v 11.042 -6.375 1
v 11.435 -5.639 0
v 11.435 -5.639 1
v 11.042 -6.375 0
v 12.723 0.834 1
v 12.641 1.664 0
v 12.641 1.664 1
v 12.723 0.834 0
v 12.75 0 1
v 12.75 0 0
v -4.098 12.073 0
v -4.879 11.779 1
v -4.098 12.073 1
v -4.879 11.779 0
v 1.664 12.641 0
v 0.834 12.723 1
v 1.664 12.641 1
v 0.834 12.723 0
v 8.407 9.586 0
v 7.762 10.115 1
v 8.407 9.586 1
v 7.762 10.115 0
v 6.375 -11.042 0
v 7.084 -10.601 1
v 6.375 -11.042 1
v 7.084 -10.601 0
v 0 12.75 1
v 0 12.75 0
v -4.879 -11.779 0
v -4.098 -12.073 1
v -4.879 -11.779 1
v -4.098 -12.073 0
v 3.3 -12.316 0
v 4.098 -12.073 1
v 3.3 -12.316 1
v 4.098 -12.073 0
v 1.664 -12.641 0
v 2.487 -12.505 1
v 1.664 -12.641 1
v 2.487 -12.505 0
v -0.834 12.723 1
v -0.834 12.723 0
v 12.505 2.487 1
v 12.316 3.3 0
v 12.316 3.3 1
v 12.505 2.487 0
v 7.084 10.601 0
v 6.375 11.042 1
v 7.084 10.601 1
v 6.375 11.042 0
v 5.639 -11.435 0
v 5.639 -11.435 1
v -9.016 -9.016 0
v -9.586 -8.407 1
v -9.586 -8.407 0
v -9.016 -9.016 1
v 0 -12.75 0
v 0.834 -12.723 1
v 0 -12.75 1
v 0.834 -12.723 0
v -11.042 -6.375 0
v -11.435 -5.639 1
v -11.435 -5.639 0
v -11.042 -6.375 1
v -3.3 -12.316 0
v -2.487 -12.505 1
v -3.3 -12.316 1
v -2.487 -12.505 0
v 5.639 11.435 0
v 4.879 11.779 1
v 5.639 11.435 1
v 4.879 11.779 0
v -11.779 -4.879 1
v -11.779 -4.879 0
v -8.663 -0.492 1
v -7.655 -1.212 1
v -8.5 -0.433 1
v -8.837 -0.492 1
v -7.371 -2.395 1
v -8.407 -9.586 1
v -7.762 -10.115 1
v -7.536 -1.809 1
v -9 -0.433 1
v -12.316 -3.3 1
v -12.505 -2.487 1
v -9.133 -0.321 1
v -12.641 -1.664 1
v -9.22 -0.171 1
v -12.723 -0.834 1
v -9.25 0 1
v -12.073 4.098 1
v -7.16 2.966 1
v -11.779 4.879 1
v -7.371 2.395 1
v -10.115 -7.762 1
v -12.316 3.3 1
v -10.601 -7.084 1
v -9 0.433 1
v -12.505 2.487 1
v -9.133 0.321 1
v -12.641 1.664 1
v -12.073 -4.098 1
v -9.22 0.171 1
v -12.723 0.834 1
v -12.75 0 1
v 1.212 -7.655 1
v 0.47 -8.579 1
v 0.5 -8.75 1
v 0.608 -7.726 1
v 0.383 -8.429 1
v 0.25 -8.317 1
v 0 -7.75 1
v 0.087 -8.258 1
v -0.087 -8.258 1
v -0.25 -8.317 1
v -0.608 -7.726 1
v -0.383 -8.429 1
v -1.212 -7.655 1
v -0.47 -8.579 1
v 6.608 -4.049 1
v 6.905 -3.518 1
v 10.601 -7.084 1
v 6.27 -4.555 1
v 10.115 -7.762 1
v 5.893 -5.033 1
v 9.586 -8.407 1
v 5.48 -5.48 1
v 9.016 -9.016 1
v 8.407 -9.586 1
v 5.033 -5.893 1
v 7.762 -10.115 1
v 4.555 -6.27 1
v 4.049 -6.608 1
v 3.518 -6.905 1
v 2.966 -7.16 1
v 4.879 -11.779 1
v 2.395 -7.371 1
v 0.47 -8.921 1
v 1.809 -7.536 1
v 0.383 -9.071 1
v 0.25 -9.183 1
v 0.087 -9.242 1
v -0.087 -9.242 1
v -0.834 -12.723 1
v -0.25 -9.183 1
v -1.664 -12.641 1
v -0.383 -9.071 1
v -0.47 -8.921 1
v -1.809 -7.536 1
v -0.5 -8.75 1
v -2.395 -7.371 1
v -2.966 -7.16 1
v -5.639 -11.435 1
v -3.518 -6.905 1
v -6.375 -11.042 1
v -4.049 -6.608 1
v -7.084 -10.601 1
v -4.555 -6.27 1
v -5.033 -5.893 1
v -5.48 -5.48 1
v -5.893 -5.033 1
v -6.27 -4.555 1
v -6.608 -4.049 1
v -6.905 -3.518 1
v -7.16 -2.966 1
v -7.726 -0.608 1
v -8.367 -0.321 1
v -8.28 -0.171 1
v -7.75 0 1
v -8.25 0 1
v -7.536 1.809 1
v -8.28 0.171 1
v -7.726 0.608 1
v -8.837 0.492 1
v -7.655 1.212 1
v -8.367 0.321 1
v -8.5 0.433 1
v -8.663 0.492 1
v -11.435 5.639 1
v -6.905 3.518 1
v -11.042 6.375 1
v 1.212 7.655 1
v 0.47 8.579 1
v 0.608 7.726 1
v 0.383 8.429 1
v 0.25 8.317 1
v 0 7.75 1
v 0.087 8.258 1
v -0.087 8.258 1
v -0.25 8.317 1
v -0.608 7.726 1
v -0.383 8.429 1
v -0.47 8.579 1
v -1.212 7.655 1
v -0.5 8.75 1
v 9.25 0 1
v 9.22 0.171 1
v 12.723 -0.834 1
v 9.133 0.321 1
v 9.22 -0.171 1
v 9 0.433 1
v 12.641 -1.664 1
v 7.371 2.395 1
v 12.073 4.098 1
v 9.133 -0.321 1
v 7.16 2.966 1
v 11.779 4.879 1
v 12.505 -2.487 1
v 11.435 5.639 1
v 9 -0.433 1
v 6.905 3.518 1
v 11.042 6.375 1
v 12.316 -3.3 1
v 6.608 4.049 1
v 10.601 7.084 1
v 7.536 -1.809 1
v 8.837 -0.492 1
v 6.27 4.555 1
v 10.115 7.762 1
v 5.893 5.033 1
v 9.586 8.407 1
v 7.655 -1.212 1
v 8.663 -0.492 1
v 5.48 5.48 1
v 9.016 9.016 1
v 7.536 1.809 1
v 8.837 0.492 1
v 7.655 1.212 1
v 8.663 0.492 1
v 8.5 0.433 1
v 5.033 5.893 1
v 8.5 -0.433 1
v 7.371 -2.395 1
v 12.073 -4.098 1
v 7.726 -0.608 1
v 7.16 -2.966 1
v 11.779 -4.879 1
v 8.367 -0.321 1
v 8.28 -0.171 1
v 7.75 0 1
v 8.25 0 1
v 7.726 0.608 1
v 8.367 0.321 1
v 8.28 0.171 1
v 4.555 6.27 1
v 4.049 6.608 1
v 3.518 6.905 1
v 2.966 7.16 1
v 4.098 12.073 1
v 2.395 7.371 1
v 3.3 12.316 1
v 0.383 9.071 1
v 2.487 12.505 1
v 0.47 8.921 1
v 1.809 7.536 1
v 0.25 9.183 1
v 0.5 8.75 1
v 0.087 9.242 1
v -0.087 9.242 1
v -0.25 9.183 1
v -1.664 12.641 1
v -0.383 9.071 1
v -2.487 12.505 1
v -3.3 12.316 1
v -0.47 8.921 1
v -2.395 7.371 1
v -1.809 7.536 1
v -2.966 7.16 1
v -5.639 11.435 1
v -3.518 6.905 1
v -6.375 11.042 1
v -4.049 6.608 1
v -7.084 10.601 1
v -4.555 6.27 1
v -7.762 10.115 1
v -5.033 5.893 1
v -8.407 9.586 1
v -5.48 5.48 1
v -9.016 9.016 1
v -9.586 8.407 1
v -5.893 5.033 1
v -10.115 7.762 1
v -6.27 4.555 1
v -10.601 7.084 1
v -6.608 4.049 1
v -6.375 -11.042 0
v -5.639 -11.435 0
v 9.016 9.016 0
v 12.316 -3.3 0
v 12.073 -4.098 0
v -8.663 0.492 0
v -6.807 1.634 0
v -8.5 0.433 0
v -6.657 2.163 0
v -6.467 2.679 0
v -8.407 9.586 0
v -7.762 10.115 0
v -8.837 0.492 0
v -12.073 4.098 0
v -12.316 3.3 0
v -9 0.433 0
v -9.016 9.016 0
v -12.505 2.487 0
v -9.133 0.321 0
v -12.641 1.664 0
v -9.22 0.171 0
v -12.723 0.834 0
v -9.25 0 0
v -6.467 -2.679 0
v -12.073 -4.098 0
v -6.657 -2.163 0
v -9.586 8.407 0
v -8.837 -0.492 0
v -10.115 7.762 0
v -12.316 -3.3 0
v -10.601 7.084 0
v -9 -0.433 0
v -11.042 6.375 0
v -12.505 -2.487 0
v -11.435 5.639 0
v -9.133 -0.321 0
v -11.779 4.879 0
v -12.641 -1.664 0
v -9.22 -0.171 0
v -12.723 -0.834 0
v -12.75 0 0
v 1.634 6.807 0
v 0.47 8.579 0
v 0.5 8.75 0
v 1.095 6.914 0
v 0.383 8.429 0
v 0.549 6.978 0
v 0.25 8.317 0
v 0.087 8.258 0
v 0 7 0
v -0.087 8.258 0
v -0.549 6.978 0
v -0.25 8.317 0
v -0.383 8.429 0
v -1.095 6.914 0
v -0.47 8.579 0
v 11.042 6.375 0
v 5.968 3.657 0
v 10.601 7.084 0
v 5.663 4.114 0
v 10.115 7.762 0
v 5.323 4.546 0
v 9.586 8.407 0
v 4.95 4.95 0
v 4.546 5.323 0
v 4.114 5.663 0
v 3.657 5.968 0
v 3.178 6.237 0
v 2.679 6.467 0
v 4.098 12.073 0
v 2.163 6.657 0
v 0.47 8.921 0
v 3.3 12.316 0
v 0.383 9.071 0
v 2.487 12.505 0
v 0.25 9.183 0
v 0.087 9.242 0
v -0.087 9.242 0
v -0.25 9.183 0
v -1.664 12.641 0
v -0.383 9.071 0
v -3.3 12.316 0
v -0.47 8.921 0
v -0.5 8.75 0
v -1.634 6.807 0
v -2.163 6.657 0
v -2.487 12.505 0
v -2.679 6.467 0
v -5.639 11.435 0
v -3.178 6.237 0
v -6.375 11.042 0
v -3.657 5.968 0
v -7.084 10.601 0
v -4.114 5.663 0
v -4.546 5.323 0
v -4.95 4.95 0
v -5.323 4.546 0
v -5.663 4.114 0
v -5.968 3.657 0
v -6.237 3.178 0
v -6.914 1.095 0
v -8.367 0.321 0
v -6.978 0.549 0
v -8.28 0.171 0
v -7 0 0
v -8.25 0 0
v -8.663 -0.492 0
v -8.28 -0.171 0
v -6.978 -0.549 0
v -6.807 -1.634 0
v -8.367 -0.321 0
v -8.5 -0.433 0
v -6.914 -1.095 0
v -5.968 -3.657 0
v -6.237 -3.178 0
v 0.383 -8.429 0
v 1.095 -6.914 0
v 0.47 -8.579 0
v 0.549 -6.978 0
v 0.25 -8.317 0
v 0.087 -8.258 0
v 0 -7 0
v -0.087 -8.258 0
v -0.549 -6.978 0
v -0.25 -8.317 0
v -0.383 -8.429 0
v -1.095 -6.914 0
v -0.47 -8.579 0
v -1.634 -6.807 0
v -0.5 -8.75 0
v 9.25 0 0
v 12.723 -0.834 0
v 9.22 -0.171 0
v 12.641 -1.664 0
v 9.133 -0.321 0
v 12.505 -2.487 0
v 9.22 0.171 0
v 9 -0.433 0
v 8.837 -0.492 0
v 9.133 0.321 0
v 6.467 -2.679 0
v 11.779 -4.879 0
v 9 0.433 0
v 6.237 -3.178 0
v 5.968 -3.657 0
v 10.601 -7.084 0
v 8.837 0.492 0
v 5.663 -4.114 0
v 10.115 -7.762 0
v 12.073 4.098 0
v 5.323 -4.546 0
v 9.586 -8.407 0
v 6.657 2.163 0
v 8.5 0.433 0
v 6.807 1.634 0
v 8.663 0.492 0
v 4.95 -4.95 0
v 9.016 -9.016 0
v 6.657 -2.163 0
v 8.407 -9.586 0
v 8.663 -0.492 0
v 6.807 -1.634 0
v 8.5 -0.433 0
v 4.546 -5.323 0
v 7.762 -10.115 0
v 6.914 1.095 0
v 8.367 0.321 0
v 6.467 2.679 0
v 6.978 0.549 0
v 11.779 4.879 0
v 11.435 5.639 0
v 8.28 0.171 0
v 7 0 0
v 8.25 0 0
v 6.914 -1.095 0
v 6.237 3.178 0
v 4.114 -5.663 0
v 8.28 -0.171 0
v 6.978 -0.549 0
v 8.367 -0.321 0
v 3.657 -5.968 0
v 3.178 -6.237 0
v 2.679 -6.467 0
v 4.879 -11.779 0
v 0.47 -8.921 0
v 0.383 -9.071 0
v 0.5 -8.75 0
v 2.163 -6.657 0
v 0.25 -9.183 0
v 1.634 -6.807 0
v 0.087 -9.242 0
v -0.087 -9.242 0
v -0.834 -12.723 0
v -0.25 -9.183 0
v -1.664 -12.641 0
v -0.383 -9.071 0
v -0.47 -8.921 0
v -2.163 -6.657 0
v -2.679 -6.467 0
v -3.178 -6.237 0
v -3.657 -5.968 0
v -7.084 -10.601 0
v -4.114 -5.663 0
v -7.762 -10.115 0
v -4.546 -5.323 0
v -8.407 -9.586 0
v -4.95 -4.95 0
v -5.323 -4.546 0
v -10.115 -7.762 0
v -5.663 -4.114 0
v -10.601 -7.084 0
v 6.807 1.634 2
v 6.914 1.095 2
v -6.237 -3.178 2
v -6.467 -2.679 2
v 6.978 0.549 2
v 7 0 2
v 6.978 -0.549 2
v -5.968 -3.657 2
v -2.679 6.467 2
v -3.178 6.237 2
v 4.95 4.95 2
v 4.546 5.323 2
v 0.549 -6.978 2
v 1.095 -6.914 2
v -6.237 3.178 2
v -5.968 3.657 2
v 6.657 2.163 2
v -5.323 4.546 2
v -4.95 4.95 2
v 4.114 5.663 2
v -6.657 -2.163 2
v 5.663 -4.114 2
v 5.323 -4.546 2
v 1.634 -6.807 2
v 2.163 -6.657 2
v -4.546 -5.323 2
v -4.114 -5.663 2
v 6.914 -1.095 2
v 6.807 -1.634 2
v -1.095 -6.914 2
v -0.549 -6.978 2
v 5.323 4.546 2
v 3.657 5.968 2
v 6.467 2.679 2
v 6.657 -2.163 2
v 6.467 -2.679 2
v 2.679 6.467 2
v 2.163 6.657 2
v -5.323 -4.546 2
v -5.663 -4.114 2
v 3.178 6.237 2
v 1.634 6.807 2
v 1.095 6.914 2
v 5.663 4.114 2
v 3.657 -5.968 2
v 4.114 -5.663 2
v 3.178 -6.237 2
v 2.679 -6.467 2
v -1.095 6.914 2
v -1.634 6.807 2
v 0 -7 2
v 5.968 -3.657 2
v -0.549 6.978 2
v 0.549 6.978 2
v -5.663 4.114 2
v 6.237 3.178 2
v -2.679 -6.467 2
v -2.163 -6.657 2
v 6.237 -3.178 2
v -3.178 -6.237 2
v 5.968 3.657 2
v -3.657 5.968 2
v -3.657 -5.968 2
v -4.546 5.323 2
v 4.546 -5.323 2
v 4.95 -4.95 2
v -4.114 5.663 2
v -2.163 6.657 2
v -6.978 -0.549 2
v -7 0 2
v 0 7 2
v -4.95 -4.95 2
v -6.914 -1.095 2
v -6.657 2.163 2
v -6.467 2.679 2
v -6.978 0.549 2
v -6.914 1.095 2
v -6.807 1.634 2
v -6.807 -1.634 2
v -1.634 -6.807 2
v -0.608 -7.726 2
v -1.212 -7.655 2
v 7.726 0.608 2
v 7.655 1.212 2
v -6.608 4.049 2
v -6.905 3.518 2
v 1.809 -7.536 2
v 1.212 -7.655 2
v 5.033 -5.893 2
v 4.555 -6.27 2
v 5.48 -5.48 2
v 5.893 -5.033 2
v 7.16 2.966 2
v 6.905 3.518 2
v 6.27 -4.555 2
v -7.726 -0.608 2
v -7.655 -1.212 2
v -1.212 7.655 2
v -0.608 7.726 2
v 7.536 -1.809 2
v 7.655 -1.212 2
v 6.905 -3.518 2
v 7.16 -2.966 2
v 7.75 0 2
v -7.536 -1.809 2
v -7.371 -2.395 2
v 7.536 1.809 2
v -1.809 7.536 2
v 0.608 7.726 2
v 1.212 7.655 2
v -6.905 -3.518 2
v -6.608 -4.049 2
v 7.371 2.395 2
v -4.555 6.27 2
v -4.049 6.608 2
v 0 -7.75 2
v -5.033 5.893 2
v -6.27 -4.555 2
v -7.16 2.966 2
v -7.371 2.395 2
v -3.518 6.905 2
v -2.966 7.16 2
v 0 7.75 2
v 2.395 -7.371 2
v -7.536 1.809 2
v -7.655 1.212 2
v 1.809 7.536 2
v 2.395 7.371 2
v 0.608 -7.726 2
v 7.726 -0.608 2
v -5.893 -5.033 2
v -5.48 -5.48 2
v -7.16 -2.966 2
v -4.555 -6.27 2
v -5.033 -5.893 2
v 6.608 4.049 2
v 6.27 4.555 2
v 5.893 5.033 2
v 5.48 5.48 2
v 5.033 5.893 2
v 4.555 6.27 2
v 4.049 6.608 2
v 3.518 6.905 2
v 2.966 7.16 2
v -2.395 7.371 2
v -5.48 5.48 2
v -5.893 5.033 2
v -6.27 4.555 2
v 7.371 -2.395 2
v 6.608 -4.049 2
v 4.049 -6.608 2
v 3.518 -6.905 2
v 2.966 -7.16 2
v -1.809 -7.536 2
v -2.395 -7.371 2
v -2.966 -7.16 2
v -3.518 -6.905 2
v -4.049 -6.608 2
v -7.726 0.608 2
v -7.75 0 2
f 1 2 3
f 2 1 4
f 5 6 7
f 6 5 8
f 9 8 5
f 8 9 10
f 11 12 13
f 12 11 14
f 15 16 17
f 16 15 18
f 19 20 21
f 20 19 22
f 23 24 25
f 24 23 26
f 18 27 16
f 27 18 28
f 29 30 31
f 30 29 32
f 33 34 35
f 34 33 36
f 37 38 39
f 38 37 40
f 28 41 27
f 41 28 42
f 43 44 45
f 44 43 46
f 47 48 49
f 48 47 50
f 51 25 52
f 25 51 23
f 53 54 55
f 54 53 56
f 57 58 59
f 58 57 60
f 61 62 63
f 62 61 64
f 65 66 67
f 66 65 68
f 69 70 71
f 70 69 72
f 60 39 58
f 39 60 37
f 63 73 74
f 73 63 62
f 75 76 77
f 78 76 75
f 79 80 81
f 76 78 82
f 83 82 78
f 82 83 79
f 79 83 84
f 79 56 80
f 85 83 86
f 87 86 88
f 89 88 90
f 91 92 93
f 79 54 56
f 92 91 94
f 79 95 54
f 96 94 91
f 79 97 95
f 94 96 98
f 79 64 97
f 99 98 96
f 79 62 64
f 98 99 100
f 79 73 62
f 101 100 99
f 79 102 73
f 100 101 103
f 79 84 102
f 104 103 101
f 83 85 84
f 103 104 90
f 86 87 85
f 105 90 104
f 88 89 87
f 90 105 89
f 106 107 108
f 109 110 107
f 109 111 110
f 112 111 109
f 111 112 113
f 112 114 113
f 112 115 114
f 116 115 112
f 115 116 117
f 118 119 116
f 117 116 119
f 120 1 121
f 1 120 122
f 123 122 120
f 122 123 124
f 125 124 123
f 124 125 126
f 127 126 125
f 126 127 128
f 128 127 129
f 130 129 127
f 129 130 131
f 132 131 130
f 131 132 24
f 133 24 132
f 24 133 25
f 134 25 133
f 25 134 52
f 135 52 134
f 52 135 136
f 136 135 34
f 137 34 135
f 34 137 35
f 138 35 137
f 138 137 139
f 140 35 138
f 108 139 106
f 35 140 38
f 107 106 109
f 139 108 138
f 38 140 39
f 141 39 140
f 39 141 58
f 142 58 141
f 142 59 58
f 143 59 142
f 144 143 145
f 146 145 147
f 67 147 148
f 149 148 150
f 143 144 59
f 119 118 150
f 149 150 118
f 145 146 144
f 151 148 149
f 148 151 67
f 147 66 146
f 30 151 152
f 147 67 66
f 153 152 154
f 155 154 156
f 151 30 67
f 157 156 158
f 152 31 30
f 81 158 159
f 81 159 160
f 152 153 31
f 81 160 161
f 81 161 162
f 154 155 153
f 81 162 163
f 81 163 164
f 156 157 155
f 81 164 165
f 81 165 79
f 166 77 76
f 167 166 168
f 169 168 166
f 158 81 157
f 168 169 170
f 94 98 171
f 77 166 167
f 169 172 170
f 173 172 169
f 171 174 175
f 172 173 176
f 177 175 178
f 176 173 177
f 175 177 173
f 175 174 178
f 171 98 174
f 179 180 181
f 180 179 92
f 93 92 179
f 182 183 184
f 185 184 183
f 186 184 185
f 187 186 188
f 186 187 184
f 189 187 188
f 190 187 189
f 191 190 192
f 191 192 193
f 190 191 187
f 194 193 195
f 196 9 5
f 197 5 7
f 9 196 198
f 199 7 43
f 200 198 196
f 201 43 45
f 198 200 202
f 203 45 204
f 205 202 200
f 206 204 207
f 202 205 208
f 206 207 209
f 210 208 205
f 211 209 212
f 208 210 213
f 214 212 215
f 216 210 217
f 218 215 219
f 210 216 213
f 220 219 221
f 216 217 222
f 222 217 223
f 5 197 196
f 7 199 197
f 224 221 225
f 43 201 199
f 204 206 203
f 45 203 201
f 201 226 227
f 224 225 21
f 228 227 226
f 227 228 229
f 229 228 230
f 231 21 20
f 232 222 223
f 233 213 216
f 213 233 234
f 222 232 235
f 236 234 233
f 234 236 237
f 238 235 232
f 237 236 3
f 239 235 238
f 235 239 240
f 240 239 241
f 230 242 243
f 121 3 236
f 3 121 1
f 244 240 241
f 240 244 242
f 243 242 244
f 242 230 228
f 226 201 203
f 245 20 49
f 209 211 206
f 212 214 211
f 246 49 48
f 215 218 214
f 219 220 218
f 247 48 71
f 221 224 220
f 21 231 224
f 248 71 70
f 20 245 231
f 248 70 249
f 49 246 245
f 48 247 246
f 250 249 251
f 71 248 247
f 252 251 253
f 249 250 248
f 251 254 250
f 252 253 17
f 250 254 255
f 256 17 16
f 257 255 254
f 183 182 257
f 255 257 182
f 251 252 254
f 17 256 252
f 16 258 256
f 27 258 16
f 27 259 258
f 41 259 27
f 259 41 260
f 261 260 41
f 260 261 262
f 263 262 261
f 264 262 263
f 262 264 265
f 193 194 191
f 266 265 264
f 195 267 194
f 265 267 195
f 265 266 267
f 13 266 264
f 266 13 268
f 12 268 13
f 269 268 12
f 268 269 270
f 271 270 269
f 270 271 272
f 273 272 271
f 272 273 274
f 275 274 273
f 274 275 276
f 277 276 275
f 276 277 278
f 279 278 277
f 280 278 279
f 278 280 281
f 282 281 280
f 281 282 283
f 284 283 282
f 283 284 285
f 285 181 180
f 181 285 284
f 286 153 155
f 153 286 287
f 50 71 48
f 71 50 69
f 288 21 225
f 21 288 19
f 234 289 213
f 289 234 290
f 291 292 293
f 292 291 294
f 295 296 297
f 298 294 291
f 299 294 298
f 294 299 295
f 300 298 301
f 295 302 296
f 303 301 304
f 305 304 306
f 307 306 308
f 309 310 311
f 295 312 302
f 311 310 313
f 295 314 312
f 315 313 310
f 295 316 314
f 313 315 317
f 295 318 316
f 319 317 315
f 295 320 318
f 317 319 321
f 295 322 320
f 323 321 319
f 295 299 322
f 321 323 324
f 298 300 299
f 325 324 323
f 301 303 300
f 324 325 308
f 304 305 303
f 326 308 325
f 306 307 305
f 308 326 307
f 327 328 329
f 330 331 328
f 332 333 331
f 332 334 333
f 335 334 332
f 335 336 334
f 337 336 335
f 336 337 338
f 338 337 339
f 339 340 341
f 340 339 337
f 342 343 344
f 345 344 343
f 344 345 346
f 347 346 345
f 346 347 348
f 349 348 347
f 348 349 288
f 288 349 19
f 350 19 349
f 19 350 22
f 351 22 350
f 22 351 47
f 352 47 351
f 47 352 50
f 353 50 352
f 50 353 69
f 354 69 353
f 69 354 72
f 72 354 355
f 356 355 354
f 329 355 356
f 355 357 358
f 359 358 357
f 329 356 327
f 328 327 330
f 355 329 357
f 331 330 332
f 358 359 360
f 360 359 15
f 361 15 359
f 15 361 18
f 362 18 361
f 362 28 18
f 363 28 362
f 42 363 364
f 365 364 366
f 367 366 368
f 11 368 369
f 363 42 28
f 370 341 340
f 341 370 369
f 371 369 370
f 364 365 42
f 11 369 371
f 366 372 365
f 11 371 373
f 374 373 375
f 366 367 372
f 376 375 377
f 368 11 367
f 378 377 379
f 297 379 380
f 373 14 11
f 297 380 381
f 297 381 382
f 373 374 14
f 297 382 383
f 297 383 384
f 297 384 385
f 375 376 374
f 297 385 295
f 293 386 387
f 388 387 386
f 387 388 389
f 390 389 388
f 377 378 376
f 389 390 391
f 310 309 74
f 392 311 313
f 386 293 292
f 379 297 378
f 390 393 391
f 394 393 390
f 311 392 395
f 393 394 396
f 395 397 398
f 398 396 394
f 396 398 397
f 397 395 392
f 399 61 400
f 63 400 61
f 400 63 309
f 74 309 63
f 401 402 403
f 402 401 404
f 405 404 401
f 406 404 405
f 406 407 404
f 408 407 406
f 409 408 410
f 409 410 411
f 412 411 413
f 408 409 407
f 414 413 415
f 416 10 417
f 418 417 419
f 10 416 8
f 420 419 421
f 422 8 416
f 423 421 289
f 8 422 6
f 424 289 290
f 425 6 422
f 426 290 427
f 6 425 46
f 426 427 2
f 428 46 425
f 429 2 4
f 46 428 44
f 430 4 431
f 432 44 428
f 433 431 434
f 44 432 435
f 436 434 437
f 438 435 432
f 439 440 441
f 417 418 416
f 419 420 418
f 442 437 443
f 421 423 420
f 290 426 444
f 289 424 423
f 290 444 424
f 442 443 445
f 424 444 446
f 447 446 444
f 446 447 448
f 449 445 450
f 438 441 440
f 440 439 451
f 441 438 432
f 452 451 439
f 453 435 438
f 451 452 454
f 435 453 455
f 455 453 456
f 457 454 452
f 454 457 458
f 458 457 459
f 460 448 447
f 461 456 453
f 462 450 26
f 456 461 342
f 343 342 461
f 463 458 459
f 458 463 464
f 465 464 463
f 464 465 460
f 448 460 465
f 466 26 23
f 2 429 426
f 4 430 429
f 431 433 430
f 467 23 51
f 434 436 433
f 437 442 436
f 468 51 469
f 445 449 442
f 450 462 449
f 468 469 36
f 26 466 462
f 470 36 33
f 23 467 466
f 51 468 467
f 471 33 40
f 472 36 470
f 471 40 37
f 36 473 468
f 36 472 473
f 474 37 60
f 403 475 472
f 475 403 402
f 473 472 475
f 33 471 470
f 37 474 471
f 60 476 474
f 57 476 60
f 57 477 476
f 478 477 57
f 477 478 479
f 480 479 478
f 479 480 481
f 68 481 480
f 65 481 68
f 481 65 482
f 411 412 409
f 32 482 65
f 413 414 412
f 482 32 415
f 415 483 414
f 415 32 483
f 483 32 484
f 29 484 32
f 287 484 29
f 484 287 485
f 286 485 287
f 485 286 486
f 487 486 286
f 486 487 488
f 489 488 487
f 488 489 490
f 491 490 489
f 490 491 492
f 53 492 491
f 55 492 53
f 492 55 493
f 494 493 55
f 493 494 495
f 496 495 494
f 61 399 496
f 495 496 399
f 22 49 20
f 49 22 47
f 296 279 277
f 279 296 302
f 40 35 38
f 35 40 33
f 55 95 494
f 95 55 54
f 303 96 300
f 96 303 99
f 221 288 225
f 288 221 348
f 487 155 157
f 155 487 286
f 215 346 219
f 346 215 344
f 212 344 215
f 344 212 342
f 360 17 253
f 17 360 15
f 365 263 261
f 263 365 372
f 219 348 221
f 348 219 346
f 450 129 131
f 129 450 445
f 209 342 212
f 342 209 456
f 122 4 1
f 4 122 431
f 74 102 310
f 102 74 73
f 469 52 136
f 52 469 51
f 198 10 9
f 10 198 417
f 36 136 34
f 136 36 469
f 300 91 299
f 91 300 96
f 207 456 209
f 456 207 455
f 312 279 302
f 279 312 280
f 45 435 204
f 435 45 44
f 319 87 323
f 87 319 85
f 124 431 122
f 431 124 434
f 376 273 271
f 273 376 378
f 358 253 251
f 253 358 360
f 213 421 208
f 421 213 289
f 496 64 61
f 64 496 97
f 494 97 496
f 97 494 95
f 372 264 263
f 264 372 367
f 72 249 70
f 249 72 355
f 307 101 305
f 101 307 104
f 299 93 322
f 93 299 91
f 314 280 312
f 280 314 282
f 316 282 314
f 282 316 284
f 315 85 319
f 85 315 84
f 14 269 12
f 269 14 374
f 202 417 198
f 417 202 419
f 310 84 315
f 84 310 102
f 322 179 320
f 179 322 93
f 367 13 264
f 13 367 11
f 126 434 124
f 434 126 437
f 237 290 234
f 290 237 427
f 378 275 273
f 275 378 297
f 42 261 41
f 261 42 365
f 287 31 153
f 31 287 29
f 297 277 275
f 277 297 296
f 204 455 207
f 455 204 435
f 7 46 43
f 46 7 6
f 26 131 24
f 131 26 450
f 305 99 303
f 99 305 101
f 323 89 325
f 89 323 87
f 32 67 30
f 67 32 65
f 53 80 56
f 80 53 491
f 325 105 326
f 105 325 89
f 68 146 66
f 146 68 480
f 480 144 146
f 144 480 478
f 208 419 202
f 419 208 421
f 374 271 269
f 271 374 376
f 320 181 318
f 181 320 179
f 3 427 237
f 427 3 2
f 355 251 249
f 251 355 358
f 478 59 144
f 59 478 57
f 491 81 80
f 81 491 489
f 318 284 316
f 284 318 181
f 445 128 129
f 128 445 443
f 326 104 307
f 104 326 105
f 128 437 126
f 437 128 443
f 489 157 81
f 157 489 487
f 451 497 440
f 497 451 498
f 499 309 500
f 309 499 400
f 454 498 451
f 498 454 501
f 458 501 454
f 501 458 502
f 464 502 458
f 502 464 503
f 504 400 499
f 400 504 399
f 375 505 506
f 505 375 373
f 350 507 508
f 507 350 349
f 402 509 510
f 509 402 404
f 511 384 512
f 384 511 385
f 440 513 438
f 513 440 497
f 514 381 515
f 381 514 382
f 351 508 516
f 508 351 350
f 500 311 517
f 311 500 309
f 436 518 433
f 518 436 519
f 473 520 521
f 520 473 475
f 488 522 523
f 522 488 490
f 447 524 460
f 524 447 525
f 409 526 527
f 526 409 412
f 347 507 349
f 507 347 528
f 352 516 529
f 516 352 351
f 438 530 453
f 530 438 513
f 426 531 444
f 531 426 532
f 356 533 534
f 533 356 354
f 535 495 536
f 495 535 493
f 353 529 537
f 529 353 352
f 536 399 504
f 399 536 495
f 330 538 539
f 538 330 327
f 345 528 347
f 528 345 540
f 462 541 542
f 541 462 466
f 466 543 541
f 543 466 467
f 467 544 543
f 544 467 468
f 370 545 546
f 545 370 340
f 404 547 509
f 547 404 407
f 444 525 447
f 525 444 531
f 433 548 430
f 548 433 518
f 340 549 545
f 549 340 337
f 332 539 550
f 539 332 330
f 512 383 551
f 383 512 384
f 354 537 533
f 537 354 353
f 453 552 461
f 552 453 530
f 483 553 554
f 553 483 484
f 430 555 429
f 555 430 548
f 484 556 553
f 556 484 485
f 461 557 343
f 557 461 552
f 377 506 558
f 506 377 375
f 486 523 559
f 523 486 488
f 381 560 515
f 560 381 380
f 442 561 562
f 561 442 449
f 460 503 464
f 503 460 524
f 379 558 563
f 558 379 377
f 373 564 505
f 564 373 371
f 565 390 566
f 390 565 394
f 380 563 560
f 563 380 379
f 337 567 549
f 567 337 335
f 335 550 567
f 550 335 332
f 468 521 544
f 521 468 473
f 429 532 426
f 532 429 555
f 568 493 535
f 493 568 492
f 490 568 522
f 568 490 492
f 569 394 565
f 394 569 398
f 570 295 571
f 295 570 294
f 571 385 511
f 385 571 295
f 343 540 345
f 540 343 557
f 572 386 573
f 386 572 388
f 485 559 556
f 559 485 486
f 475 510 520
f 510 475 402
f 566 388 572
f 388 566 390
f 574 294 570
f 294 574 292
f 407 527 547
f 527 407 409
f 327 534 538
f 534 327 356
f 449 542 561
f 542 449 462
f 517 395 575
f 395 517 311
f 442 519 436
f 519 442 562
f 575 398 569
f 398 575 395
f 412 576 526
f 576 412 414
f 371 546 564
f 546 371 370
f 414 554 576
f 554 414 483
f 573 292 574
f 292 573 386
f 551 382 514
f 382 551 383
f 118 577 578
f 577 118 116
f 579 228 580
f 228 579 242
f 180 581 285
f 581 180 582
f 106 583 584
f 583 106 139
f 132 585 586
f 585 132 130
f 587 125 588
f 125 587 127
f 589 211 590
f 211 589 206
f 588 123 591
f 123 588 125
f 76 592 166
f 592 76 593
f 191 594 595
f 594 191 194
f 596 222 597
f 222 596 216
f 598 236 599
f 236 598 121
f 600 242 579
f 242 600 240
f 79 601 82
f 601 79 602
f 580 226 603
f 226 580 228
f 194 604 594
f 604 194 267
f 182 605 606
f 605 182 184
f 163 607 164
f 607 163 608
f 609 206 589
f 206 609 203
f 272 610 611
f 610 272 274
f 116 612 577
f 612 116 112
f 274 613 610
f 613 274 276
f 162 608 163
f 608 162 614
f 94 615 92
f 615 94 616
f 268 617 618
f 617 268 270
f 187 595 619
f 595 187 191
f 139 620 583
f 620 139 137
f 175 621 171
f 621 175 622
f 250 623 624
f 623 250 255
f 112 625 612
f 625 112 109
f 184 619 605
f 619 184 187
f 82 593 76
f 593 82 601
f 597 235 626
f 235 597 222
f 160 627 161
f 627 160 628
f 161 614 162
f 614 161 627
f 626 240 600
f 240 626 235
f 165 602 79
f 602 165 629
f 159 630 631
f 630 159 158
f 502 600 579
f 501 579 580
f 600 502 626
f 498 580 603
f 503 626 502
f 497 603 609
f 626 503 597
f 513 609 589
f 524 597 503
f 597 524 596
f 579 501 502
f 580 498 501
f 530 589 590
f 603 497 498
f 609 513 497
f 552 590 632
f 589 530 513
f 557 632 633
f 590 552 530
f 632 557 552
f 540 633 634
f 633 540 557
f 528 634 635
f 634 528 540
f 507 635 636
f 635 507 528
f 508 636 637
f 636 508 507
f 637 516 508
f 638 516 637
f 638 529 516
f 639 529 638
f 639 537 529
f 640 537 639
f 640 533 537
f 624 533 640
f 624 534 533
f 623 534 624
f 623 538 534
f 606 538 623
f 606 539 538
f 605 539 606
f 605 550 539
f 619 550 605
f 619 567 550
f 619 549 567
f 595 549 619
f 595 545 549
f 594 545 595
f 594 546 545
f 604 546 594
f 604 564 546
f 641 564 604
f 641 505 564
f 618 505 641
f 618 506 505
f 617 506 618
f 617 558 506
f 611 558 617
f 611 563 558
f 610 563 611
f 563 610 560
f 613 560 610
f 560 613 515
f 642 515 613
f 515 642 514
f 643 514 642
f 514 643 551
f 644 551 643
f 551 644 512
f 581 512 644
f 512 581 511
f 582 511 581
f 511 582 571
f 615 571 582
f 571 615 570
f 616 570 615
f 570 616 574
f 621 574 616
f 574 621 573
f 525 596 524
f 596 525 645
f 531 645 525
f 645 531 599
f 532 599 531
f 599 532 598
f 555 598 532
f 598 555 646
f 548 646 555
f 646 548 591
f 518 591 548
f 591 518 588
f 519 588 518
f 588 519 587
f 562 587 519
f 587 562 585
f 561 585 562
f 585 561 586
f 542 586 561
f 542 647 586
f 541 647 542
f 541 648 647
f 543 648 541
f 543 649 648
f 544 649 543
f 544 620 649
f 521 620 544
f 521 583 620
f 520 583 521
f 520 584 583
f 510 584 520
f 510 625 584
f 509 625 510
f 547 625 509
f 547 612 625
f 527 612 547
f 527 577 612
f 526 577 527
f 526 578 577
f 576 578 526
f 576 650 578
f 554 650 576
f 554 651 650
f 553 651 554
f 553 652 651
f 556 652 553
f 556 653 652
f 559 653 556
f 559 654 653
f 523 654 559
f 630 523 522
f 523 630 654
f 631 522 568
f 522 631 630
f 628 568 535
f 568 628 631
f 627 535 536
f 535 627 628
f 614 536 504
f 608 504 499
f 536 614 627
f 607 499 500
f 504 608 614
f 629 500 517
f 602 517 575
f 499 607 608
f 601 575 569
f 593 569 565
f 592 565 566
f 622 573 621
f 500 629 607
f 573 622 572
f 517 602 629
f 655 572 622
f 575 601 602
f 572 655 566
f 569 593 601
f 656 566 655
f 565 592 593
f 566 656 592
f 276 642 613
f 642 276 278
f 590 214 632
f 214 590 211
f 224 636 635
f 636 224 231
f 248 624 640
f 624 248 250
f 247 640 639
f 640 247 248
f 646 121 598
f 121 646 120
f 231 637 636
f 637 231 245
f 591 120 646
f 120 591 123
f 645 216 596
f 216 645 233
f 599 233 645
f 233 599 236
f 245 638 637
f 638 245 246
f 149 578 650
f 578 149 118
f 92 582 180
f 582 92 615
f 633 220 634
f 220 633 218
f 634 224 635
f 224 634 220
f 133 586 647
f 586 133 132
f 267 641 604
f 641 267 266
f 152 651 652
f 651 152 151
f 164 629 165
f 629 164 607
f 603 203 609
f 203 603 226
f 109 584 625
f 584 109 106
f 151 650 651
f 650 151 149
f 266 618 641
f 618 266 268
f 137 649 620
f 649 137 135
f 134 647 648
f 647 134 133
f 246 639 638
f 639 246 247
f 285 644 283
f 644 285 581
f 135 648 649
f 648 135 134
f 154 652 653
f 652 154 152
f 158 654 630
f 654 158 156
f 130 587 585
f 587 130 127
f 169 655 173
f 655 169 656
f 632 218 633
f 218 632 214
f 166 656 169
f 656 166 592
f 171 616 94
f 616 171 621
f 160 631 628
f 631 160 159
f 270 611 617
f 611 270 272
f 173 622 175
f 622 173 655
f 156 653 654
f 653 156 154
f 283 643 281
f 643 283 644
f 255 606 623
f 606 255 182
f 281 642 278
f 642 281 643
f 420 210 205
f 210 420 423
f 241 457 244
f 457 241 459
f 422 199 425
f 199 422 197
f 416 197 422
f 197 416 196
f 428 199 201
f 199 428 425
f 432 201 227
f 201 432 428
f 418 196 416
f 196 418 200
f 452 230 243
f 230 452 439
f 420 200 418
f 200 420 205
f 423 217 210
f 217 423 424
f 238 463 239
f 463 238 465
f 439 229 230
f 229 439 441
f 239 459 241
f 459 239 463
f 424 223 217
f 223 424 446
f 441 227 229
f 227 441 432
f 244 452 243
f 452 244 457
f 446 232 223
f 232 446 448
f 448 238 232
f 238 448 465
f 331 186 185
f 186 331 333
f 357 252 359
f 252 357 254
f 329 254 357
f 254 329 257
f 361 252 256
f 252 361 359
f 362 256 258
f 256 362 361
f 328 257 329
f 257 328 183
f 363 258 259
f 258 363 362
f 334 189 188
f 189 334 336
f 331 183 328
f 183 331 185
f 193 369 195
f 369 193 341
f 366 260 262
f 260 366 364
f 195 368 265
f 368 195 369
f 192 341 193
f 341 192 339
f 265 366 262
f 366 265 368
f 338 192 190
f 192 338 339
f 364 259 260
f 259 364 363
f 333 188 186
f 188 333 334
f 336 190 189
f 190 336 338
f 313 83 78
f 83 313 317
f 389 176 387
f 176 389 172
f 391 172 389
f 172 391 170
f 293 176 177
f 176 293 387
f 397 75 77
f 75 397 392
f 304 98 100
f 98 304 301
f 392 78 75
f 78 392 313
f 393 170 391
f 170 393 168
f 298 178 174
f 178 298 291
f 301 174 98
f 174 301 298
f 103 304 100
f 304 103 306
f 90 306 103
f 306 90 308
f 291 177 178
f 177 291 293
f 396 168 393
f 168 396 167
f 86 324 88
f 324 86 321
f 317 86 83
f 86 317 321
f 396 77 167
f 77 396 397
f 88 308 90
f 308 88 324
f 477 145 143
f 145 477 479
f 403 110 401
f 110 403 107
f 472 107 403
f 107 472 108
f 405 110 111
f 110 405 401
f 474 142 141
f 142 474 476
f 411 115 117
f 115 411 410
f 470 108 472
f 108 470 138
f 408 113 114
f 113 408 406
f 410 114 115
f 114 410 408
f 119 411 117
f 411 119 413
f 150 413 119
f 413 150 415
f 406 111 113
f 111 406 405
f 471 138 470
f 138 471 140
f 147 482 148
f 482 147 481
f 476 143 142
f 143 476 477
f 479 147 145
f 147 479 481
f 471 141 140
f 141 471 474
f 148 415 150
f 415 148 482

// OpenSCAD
// part_id: jup18
// name: Jupiter pointer ring outer
// source_drawing_ids: DRW-012
// units: mm
// revision: 0.1
// SPDX-License-Identifier: MIT

module part_jup18(
    outer_d = 25.5,
    inner_d = 14.0,
    shoulder_d = 15.5,
    base_h = 1.0,
    shoulder_h = 1.0,
    rivet_d = 1.0,
    rivet_pcd = 17.5,
    rivet_count = 4
) {
    difference() {
        union() {
            difference() {
                cylinder(d = outer_d, h = base_h, $fn = 96);
                translate([0, 0, -0.05]) cylinder(d = inner_d, h = base_h + 0.1, $fn = 80);
            }
            translate([0, 0, base_h])
                difference() {
                    cylinder(d = shoulder_d, h = shoulder_h, $fn = 80);
                    translate([0, 0, -0.05]) cylinder(d = inner_d, h = shoulder_h + 0.1, $fn = 80);
                }
        }
        for (i = [0 : rivet_count - 1]) {
            a = i * 360 / rivet_count;
            translate([(rivet_pcd / 2) * cos(a), (rivet_pcd / 2) * sin(a), -0.1])
                cylinder(d = rivet_d, h = base_h + shoulder_h + 0.2, $fn = 18);
        }
    }
}

// ---- "main guard" ----
// Default to previewing when opened directly:
if (is_undef(__LIB_MODE__)) {
    part_jup18();
}
